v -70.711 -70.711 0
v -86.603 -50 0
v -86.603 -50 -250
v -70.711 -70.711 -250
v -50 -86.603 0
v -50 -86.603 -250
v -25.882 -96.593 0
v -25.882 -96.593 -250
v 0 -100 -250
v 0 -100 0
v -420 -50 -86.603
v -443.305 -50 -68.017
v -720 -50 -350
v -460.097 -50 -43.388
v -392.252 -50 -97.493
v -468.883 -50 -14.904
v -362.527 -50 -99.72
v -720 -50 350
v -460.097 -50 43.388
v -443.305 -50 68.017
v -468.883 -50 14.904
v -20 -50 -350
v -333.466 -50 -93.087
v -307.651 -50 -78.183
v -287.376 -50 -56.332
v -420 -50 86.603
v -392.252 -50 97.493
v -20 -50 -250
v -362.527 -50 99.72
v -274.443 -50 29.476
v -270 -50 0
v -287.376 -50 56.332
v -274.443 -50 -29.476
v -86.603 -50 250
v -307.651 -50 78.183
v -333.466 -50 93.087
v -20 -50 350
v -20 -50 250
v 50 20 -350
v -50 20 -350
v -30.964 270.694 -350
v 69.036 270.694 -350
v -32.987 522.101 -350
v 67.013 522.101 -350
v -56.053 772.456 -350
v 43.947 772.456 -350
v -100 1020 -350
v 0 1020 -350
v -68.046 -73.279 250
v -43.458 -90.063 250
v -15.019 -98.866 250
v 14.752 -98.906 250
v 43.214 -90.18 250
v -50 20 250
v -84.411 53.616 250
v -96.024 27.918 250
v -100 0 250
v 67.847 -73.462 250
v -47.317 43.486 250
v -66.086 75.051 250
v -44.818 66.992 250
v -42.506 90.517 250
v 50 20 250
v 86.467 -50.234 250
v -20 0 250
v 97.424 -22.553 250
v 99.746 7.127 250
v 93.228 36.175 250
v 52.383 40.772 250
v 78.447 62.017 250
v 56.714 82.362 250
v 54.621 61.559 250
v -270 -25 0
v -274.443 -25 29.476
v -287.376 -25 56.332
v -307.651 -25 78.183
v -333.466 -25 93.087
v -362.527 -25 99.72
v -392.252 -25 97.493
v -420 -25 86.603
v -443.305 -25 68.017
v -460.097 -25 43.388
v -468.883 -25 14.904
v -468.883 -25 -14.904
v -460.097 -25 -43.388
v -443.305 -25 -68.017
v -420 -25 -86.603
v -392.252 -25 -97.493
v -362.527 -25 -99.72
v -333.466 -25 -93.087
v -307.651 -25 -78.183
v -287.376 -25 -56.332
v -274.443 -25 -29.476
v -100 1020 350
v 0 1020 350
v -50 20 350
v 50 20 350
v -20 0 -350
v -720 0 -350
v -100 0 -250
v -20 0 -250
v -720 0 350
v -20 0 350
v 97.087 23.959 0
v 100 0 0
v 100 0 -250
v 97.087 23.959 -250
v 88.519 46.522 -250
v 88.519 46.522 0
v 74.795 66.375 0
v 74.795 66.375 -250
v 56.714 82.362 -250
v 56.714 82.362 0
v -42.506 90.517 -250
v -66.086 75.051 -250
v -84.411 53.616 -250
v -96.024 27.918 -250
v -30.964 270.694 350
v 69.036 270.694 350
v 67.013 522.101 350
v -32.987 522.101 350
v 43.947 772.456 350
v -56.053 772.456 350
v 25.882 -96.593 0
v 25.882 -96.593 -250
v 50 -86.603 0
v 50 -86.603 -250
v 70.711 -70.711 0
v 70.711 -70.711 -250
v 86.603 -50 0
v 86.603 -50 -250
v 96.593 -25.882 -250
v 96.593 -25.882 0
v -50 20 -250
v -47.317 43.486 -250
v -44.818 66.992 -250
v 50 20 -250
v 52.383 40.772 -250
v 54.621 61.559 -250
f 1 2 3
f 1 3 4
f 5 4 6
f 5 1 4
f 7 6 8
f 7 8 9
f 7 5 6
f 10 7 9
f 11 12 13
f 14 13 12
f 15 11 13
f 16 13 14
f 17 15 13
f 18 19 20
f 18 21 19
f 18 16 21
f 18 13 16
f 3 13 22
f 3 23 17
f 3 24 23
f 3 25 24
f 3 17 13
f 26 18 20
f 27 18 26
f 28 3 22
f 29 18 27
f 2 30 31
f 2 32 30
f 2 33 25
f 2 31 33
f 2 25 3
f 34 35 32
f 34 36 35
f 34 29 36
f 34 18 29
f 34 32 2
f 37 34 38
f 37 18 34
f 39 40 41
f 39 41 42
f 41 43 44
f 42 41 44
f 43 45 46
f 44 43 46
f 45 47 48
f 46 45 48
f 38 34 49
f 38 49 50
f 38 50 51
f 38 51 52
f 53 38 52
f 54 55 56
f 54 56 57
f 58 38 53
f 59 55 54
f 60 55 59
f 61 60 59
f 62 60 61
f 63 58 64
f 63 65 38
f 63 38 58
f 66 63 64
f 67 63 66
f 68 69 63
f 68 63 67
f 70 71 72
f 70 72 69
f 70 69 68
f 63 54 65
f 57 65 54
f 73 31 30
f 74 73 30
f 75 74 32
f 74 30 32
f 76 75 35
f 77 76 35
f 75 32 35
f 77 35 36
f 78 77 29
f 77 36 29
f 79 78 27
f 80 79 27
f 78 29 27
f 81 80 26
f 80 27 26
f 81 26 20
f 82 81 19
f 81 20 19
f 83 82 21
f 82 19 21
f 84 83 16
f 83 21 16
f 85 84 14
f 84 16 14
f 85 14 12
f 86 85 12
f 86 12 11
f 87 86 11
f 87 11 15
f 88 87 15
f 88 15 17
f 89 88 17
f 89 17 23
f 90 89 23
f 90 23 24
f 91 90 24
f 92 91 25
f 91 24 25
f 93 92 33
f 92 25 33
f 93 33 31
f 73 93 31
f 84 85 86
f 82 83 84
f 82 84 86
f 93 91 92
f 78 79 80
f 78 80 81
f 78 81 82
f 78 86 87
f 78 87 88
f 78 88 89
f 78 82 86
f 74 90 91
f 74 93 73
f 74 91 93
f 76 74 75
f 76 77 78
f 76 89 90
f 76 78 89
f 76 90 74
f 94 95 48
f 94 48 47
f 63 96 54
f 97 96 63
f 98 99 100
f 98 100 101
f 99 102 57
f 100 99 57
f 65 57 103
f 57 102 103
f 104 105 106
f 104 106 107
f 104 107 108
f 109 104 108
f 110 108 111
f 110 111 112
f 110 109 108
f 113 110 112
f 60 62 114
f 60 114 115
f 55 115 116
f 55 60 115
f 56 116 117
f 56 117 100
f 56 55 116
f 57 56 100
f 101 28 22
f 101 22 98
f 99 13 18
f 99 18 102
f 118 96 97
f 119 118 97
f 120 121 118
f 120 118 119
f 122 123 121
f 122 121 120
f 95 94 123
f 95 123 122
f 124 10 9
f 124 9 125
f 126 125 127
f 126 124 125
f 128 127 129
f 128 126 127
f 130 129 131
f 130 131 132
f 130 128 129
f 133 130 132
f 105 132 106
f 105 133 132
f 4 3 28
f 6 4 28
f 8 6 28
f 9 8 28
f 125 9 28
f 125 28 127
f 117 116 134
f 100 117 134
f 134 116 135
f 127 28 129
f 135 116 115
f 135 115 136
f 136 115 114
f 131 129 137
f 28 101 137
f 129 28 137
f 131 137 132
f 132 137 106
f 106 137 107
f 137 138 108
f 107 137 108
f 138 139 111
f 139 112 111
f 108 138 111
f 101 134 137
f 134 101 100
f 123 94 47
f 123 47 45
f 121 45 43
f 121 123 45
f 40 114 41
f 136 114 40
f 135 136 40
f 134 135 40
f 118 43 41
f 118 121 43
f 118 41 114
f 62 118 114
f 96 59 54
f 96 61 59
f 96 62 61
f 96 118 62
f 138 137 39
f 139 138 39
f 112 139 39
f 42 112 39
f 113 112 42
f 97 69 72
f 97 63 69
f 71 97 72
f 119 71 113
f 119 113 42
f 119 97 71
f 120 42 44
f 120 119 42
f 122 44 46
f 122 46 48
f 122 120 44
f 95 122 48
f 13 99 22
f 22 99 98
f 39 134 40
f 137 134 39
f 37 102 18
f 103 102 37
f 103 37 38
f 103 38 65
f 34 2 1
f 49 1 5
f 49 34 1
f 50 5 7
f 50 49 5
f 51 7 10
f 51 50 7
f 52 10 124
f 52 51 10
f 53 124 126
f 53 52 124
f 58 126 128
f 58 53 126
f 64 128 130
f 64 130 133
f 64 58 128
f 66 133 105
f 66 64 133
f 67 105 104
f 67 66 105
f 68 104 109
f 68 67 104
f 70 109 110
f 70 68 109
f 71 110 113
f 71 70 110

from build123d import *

# Parameters (mm, degrees)
BOSS_EXTRUDE1_DEPTH   = 350
SKETCH2_W             = 700
SKETCH2_H             = 50
BOSS_EXTRUDE1_2_DEPTH = 350
BOSS_EXTRUDE2_DEPTH   = 250
BOSS_EXTRUDE3_START   = 250
BOSS_EXTRUDE3_DEPTH   = 250
BOSS_EXTRUDE4_START   = 350
SKETCH2_5_W           = 700
SKETCH2_5_H           = 50
BOSS_EXTRUDE4_DEPTH   = 350
SKETCH3_R             = 100
CUT_EXTRUDE1_DEPTH    = 25


with BuildPart() as part:
    # Sketch2 → Boss-Extrude1 (new body)
    with BuildSketch(Plane.XY):
        with BuildLine():
            Line((-50, 20), (50, 20))
            ThreePointArc((50, 20), (67.013270812, 522.100663541), (0, 1020))
            Line((0, 1020), (-100, 1020))
            ThreePointArc((-100, 1020), (-32.986729188, 522.100663541), (-50, 20))
        make_face()
    extrude(amount=-BOSS_EXTRUDE1_DEPTH)



with BuildPart() as body_2:
    # Sketch2 → Boss-Extrude1 2 (new body)
    with BuildSketch(Plane.XY):
        with Locations((-370, -25)):
            Rectangle(SKETCH2_W, SKETCH2_H)
    extrude(amount=-BOSS_EXTRUDE1_2_DEPTH)


with BuildPart() as part_1:
    add(part.part)

    add(body_2.part)  # Boss-Extrude2 merges body 2
    # Sketch2<3> → Boss-Extrude2 (add)
    with BuildSketch(Plane.XY):
        with BuildLine():
            ThreePointArc((-86.602540378, -50), (67.847406367, -73.462435634), (56.713912861, 82.362200602))
            ThreePointArc((56.713912861, 82.362200602), (53.519940777, 51.163553411), (50, 20))
            Line((50, 20), (-50, 20))
            ThreePointArc((-50, 20), (-46.044408297, 55.236219759), (-42.505548953, 90.516729438))
            ThreePointArc((-42.505548953, 90.516729438), (-84.411358523, 53.616439199), (-100, 0))
            Line((-100, 0), (-20, 0))
            Line((-20, 0), (-20, -50))
            Line((-20, -50), (-86.602540378, -50))
        make_face()
    extrude(amount=-BOSS_EXTRUDE2_DEPTH)

    # Sketch2<4> → Boss-Extrude3 (add)
    with BuildSketch(Plane.XY.offset(BOSS_EXTRUDE3_START)):
        with BuildLine():
            ThreePointArc((-86.602540378, -50), (67.847406367, -73.462435634), (56.713912861, 82.362200602))
            ThreePointArc((56.713912861, 82.362200602), (53.519940777, 51.163553411), (50, 20))
            Line((50, 20), (-50, 20))
            ThreePointArc((-50, 20), (-46.044408297, 55.236219759), (-42.505548953, 90.516729438))
            ThreePointArc((-42.505548953, 90.516729438), (-84.411358523, 53.616439199), (-100, 0))
            Line((-100, 0), (-20, 0))
            Line((-20, 0), (-20, -50))
            Line((-20, -50), (-86.602540378, -50))
        make_face()
    extrude(amount=-BOSS_EXTRUDE3_DEPTH)

    # Sketch2<5> → Boss-Extrude4 (add)
    with BuildSketch(Plane.XY.offset(BOSS_EXTRUDE4_START)):
        with BuildLine():
            Line((-50, 20), (50, 20))
            ThreePointArc((50, 20), (67.013270812, 522.100663541), (0, 1020))
            Line((0, 1020), (-100, 1020))
            ThreePointArc((-100, 1020), (-32.986729188, 522.100663541), (-50, 20))
        make_face()
        with Locations((-370, -25)):
            Rectangle(SKETCH2_5_W, SKETCH2_5_H)
    extrude(amount=-BOSS_EXTRUDE4_DEPTH)

    # Sketch3 → Cut-Extrude1 (cut)
    with BuildSketch(Plane.XZ.offset(50)):
        with Locations((-370, 0)):
            Circle(SKETCH3_R)
    extrude(amount=-CUT_EXTRUDE1_DEPTH, mode=Mode.SUBTRACT)


solid = part_1.part
